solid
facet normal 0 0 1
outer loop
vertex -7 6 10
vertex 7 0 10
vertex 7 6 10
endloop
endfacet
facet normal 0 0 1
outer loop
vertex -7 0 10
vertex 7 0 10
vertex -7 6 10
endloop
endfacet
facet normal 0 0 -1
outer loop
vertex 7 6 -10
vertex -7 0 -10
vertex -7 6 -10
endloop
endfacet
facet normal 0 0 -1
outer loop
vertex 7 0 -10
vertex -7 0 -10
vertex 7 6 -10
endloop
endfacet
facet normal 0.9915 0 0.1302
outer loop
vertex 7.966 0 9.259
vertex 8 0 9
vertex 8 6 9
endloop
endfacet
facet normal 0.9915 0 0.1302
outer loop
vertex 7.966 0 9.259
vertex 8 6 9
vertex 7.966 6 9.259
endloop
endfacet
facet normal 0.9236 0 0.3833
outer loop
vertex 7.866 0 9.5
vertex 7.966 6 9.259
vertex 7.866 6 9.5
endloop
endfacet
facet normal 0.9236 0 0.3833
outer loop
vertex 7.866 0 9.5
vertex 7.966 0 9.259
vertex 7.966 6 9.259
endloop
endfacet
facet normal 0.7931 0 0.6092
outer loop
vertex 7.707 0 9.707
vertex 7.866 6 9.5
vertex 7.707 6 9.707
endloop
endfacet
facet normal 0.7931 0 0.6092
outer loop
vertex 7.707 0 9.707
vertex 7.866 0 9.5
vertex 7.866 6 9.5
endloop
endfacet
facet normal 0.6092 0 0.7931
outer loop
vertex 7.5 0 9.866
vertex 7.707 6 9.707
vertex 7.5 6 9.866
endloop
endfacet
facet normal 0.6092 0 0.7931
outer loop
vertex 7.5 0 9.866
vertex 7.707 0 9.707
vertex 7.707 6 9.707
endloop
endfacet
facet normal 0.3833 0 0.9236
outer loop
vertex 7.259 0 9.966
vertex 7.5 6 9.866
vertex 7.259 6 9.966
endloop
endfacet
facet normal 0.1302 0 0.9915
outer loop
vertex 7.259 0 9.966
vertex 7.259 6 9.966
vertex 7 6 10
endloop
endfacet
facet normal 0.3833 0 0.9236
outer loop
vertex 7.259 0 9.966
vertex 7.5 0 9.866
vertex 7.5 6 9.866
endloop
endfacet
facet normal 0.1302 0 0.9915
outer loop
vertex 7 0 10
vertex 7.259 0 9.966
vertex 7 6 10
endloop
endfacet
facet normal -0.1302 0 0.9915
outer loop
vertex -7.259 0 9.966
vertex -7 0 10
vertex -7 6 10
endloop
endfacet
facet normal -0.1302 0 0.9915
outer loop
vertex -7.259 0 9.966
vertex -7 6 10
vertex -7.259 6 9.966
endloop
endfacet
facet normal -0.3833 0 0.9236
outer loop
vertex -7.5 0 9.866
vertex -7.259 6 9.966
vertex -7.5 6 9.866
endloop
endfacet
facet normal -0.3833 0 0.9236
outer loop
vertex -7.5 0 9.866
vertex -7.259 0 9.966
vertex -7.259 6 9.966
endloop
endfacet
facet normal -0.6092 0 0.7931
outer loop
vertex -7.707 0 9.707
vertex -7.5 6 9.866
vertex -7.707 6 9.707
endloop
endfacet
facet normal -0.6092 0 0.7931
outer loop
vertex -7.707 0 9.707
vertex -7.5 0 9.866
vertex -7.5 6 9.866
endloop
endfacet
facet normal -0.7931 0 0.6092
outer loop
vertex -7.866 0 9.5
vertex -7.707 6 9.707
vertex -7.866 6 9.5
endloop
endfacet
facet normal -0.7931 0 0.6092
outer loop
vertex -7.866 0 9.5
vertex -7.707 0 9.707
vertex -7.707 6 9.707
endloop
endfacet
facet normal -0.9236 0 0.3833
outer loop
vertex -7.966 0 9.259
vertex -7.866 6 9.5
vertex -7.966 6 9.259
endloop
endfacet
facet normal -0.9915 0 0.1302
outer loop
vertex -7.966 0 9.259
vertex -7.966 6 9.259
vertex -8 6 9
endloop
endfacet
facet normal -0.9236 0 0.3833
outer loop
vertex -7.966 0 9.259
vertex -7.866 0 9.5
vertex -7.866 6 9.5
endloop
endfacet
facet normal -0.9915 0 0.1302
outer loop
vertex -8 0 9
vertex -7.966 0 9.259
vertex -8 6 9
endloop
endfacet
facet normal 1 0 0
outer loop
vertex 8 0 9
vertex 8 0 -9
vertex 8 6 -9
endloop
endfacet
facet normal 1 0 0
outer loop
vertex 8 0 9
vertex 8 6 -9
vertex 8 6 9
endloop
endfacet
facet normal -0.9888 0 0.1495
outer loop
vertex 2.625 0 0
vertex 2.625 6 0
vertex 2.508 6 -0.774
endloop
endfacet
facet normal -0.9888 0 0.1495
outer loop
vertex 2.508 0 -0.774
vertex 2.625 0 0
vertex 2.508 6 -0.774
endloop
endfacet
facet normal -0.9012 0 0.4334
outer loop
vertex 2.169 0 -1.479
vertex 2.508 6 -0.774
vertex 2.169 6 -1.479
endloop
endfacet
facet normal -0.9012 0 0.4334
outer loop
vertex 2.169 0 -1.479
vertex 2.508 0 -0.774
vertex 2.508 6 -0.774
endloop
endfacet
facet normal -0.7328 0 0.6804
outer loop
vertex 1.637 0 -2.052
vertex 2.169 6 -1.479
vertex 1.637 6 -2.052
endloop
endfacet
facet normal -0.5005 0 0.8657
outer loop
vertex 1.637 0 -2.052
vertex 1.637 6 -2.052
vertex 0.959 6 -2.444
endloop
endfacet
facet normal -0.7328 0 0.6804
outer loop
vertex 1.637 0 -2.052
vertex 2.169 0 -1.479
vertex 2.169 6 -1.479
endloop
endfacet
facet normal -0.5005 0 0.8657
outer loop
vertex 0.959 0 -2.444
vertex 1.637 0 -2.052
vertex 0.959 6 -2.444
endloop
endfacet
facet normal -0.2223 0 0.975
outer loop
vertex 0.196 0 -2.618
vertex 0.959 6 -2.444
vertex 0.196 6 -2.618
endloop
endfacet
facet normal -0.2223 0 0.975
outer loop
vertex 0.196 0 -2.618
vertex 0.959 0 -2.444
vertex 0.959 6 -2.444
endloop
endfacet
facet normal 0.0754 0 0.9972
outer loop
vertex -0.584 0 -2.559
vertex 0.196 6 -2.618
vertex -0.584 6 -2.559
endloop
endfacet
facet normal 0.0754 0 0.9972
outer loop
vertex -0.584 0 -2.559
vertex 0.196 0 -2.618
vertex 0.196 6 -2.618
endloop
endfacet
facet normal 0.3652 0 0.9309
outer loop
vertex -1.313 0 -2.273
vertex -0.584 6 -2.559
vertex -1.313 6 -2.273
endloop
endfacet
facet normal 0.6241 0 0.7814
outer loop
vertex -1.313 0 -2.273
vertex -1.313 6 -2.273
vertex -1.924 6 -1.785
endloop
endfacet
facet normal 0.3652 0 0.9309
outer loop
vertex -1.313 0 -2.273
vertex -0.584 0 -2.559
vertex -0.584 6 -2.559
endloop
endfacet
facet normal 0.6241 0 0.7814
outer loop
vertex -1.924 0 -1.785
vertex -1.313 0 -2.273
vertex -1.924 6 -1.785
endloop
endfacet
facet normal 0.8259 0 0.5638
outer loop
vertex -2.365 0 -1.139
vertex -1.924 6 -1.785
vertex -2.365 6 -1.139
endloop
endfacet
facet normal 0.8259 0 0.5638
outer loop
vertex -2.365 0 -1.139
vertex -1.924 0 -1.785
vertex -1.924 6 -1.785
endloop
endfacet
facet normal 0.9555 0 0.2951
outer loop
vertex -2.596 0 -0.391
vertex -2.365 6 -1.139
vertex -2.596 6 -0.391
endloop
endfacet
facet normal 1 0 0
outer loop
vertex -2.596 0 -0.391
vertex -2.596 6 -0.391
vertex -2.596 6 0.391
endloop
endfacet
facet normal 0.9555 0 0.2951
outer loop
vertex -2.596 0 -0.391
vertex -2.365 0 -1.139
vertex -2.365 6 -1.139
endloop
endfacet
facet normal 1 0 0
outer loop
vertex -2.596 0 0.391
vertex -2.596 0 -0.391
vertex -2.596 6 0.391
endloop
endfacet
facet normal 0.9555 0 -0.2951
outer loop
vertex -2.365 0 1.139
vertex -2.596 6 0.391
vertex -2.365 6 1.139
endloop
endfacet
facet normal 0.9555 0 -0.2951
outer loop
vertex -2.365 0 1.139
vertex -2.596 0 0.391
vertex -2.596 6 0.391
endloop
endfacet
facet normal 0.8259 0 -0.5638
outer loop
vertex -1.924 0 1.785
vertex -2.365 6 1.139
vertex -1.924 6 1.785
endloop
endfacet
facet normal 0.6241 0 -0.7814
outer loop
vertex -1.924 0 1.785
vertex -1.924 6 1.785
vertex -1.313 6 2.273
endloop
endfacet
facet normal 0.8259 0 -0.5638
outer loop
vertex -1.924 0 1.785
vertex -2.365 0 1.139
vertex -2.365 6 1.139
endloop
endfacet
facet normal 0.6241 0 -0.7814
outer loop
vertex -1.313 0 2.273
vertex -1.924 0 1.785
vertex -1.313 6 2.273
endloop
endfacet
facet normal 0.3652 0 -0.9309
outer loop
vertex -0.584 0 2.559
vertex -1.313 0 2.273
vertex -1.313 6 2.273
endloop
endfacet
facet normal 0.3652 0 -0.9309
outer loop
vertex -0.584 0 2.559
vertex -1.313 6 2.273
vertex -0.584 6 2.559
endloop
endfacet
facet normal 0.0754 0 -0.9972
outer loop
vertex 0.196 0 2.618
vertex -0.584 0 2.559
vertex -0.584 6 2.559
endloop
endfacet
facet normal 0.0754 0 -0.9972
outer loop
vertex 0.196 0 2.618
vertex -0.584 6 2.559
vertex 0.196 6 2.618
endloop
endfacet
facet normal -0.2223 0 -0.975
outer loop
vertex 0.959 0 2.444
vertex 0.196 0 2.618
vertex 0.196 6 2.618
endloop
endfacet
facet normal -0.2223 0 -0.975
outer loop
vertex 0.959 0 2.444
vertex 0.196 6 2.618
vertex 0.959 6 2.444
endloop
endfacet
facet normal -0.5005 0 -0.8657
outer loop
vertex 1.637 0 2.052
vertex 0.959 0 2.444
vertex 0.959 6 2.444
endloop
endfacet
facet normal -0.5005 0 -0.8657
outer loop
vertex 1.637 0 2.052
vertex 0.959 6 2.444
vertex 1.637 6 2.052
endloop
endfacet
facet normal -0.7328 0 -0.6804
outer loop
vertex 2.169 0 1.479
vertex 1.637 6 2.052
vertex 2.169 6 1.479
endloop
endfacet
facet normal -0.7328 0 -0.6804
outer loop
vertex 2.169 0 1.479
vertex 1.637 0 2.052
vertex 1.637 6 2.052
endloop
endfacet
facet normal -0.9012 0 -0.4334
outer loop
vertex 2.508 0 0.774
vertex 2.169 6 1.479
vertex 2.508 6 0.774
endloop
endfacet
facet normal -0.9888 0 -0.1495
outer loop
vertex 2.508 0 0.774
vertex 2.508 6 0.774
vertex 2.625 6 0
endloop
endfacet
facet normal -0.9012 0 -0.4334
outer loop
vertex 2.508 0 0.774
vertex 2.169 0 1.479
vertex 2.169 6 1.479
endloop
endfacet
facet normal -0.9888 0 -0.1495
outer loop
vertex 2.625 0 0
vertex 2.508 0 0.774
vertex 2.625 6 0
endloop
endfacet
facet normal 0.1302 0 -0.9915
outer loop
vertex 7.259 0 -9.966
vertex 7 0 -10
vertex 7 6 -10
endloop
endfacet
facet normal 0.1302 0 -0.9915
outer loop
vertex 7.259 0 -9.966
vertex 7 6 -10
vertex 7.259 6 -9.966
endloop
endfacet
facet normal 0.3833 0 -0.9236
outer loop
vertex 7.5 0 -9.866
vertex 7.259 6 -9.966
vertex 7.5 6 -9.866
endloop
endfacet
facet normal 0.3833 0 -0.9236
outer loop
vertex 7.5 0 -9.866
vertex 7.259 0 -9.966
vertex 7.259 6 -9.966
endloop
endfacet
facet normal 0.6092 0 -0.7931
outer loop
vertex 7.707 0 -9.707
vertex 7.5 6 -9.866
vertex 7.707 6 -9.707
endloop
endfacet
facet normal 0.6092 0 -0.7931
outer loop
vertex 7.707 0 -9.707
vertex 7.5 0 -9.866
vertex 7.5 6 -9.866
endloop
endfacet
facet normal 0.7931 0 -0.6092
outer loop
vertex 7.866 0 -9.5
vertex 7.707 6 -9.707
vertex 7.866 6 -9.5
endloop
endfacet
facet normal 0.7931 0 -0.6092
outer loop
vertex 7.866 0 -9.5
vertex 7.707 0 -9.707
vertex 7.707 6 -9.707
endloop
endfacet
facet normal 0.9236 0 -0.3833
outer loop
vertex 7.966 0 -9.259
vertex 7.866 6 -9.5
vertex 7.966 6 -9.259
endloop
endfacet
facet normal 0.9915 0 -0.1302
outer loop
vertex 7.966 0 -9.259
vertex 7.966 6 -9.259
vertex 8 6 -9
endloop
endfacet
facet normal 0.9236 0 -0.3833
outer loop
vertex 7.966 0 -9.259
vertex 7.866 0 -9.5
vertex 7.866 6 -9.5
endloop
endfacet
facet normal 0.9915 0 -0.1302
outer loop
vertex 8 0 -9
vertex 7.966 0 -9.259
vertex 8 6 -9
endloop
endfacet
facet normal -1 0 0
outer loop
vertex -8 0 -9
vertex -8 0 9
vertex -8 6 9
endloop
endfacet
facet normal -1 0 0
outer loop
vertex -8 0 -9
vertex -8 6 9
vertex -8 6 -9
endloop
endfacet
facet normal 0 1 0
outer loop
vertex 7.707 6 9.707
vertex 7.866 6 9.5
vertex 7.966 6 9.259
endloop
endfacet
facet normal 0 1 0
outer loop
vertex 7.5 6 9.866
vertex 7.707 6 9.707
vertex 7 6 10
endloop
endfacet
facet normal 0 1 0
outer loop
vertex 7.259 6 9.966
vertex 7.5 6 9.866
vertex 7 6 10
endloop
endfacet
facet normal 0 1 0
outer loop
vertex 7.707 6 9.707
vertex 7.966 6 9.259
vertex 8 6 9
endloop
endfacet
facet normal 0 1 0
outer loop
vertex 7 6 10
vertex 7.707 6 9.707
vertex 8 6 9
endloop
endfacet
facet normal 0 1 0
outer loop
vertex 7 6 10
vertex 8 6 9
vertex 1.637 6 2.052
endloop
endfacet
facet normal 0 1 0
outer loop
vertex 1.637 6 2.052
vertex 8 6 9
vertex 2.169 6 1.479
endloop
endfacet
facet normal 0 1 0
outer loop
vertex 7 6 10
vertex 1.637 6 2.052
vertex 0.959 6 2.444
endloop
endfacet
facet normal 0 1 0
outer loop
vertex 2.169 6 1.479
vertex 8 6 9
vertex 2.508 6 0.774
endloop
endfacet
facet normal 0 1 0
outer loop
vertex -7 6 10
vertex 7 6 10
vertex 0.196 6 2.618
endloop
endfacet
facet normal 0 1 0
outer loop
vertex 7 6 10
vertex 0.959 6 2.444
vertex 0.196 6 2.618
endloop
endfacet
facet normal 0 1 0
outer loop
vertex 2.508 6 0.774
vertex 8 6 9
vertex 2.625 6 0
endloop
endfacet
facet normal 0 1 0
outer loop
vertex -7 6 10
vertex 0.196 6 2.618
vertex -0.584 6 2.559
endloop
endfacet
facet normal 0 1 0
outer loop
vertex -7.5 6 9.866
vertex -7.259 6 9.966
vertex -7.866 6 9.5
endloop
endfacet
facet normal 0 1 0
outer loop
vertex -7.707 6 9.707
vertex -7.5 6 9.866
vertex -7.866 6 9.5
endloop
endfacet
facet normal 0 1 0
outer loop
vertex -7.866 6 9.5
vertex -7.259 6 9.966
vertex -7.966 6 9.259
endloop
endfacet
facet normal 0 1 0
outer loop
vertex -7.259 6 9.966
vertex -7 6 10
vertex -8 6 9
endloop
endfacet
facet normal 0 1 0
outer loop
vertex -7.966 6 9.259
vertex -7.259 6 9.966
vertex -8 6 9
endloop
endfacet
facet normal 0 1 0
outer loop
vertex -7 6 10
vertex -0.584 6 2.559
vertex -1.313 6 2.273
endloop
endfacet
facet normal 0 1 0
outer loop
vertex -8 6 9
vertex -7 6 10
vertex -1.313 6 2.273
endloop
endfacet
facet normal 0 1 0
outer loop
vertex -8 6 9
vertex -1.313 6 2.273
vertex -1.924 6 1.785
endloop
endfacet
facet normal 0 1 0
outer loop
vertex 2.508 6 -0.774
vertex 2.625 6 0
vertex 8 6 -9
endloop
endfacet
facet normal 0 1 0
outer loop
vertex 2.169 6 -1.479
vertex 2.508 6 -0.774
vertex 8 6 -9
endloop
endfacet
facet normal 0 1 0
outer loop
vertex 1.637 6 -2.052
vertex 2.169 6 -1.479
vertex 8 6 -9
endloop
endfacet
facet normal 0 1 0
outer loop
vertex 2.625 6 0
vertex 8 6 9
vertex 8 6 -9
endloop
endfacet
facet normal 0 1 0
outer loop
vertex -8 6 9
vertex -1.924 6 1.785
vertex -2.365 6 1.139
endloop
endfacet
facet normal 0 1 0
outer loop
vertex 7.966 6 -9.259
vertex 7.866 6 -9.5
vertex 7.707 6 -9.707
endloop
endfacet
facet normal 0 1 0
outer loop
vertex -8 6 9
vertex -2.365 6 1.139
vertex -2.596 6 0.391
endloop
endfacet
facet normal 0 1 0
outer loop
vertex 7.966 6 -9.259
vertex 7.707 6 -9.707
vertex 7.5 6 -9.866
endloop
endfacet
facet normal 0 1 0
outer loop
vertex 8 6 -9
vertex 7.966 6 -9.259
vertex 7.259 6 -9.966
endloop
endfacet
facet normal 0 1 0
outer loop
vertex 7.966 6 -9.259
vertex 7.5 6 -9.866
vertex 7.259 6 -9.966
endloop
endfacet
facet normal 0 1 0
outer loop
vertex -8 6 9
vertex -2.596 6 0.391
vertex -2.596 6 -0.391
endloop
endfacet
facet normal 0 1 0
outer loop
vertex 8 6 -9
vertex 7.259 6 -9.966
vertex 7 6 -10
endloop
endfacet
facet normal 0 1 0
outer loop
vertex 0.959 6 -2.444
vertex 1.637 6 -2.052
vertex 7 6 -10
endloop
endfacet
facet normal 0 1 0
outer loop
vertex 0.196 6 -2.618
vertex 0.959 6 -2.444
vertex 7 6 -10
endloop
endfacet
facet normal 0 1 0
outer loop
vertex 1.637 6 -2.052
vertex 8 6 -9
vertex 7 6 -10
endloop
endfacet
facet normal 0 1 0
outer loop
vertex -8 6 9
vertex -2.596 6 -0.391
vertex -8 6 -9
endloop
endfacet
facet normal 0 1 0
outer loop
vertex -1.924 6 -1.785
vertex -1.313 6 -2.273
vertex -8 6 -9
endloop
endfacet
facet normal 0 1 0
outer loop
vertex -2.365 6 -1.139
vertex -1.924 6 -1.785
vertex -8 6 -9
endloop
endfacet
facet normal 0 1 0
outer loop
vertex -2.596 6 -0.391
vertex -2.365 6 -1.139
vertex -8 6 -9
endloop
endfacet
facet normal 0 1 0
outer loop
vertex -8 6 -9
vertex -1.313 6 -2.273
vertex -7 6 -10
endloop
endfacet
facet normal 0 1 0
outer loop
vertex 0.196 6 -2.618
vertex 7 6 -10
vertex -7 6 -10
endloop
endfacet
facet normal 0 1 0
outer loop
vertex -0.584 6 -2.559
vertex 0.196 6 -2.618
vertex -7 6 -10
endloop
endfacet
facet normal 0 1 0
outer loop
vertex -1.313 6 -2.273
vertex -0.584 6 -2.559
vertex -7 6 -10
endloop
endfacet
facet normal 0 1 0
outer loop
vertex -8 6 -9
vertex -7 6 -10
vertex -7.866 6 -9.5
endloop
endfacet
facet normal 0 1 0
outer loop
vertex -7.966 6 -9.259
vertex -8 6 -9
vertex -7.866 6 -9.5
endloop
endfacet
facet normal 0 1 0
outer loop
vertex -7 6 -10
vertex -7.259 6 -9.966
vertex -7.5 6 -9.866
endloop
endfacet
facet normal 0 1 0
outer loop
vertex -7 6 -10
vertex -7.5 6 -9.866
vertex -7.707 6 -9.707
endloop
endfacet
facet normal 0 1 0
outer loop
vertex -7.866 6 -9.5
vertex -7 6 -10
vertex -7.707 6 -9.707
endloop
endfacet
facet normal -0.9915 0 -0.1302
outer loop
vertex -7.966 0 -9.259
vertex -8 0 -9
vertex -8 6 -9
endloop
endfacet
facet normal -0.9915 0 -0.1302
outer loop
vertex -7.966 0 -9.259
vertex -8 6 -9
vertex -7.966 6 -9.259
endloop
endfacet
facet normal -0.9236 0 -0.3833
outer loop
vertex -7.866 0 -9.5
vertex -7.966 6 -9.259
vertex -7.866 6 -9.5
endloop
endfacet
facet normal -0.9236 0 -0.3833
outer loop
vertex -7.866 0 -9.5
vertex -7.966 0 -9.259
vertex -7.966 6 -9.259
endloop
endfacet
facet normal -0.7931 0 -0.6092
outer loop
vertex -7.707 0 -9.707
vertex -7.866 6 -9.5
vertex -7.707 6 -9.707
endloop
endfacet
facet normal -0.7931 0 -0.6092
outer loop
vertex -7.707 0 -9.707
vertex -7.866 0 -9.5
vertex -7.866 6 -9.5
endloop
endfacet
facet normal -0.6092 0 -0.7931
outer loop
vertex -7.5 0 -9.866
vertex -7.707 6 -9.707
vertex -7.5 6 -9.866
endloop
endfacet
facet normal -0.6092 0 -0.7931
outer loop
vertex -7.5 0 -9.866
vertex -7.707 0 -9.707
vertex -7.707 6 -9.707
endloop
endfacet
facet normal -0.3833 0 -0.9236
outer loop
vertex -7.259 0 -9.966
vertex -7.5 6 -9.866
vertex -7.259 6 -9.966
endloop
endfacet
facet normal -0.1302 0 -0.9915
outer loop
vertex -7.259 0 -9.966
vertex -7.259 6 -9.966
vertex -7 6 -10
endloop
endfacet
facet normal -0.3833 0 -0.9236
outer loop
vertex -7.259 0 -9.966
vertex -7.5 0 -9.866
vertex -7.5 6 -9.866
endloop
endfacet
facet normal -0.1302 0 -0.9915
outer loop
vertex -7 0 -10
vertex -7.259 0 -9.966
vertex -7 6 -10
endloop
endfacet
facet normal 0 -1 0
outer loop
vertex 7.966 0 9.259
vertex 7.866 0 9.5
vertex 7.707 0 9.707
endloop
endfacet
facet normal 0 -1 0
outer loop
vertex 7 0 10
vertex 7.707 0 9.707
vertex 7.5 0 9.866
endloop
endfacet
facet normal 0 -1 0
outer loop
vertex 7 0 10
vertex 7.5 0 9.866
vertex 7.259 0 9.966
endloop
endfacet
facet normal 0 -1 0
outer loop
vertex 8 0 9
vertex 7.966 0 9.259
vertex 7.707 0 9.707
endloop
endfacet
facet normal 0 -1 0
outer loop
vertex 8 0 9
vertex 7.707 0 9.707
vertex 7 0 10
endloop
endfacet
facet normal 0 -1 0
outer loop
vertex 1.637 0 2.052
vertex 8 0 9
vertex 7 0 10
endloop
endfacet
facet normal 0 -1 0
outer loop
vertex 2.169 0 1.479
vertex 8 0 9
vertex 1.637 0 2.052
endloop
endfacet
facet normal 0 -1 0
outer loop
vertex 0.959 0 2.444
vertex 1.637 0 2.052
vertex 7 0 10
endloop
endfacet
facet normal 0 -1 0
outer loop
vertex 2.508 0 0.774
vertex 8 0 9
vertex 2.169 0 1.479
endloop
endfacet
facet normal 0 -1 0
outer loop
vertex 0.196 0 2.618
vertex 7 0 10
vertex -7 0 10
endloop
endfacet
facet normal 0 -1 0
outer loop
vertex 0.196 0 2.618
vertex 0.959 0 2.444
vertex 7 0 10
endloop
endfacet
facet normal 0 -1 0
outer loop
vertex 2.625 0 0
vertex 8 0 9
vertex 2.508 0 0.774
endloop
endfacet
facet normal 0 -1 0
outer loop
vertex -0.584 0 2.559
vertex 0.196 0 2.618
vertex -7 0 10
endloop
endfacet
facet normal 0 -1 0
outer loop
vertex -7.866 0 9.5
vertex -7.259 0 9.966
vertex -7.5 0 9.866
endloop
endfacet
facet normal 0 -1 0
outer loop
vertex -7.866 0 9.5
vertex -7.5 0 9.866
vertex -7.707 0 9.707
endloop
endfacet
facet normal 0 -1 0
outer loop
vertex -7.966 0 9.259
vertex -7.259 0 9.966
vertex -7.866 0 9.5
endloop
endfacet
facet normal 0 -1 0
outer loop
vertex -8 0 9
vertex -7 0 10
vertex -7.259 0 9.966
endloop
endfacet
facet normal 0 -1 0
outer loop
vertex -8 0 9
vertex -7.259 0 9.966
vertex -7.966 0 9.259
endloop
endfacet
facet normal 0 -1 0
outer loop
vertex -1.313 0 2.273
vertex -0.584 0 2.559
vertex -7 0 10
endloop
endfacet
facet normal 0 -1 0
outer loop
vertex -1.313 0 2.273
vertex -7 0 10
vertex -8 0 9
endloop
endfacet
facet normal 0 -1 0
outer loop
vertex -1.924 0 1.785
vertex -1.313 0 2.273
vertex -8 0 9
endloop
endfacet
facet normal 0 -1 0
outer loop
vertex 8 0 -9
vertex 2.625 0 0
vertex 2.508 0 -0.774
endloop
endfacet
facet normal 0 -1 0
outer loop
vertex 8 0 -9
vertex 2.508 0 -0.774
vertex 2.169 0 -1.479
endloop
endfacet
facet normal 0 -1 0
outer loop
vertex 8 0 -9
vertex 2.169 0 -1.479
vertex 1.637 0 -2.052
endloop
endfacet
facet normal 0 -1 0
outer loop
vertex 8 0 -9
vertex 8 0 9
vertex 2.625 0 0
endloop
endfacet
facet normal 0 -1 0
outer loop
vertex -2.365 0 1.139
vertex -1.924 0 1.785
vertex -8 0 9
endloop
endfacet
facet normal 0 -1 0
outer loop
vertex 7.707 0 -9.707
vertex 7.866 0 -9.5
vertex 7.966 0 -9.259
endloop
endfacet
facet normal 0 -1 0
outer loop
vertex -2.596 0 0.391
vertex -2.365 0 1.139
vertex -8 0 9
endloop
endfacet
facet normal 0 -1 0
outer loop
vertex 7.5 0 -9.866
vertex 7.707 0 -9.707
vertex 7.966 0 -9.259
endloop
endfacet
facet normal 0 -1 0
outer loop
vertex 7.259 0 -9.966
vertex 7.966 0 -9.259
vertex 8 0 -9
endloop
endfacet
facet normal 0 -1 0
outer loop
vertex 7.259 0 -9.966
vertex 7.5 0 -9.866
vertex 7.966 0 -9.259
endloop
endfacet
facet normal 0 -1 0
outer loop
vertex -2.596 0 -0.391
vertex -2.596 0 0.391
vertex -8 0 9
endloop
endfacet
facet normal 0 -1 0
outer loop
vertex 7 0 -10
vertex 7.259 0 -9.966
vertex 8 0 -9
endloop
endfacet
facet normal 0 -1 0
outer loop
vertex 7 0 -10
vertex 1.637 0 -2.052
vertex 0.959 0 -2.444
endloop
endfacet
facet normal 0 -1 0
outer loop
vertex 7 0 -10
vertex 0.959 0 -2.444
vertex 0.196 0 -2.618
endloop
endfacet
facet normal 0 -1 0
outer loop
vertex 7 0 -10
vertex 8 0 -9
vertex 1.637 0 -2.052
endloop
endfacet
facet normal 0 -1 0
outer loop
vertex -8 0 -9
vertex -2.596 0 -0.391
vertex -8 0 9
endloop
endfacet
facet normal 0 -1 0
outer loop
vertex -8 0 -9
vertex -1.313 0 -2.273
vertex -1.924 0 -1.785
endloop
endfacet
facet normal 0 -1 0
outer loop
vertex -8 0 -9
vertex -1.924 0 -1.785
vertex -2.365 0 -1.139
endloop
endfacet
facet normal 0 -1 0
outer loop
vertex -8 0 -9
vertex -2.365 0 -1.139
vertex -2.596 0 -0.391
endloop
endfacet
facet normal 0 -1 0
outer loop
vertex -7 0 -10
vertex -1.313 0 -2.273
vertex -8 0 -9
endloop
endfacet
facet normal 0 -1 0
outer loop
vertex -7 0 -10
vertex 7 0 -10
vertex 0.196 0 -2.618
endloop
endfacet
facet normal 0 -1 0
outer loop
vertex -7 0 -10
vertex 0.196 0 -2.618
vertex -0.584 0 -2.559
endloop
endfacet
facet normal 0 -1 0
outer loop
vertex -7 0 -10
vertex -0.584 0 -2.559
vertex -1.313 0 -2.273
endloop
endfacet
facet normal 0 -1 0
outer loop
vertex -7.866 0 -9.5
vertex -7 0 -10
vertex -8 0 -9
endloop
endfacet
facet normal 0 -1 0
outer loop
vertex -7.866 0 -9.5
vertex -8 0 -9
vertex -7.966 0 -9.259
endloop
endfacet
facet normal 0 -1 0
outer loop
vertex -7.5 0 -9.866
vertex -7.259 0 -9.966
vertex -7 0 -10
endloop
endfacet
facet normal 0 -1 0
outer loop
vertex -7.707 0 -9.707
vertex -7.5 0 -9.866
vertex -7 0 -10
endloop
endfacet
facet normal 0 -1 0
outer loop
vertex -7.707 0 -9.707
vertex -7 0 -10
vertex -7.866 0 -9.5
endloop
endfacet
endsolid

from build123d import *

# Parameters (mm, degrees)
SKETCH1_R           = 2.625
BOSS_EXTRUDE1_DEPTH = 6


with BuildPart() as part:
    # Sketch1 → Boss-Extrude1 (new body)
    with BuildSketch(Plane(origin=(0, 0, 0), x_dir=(1, 0, 0), z_dir=(0, 1, 0))):
        with BuildLine():
            Line((-7, 10), (7, 10))
            ThreePointArc((7, 10), (7.707106781, 9.707106781), (8, 9))
            Line((8, 9), (8, -9))
            ThreePointArc((8, -9), (7.707106781, -9.707106781), (7, -10))
            Line((7, -10), (-7, -10))
            ThreePointArc((-7, -10), (-7.707106781, -9.707106781), (-8, -9))
            Line((-8, -9), (-8, 9))
            ThreePointArc((-8, 9), (-7.707106781, 9.707106781), (-7, 10))
        make_face()
        Circle(SKETCH1_R, mode=Mode.SUBTRACT)
    extrude(amount=BOSS_EXTRUDE1_DEPTH)


solid = part.part
